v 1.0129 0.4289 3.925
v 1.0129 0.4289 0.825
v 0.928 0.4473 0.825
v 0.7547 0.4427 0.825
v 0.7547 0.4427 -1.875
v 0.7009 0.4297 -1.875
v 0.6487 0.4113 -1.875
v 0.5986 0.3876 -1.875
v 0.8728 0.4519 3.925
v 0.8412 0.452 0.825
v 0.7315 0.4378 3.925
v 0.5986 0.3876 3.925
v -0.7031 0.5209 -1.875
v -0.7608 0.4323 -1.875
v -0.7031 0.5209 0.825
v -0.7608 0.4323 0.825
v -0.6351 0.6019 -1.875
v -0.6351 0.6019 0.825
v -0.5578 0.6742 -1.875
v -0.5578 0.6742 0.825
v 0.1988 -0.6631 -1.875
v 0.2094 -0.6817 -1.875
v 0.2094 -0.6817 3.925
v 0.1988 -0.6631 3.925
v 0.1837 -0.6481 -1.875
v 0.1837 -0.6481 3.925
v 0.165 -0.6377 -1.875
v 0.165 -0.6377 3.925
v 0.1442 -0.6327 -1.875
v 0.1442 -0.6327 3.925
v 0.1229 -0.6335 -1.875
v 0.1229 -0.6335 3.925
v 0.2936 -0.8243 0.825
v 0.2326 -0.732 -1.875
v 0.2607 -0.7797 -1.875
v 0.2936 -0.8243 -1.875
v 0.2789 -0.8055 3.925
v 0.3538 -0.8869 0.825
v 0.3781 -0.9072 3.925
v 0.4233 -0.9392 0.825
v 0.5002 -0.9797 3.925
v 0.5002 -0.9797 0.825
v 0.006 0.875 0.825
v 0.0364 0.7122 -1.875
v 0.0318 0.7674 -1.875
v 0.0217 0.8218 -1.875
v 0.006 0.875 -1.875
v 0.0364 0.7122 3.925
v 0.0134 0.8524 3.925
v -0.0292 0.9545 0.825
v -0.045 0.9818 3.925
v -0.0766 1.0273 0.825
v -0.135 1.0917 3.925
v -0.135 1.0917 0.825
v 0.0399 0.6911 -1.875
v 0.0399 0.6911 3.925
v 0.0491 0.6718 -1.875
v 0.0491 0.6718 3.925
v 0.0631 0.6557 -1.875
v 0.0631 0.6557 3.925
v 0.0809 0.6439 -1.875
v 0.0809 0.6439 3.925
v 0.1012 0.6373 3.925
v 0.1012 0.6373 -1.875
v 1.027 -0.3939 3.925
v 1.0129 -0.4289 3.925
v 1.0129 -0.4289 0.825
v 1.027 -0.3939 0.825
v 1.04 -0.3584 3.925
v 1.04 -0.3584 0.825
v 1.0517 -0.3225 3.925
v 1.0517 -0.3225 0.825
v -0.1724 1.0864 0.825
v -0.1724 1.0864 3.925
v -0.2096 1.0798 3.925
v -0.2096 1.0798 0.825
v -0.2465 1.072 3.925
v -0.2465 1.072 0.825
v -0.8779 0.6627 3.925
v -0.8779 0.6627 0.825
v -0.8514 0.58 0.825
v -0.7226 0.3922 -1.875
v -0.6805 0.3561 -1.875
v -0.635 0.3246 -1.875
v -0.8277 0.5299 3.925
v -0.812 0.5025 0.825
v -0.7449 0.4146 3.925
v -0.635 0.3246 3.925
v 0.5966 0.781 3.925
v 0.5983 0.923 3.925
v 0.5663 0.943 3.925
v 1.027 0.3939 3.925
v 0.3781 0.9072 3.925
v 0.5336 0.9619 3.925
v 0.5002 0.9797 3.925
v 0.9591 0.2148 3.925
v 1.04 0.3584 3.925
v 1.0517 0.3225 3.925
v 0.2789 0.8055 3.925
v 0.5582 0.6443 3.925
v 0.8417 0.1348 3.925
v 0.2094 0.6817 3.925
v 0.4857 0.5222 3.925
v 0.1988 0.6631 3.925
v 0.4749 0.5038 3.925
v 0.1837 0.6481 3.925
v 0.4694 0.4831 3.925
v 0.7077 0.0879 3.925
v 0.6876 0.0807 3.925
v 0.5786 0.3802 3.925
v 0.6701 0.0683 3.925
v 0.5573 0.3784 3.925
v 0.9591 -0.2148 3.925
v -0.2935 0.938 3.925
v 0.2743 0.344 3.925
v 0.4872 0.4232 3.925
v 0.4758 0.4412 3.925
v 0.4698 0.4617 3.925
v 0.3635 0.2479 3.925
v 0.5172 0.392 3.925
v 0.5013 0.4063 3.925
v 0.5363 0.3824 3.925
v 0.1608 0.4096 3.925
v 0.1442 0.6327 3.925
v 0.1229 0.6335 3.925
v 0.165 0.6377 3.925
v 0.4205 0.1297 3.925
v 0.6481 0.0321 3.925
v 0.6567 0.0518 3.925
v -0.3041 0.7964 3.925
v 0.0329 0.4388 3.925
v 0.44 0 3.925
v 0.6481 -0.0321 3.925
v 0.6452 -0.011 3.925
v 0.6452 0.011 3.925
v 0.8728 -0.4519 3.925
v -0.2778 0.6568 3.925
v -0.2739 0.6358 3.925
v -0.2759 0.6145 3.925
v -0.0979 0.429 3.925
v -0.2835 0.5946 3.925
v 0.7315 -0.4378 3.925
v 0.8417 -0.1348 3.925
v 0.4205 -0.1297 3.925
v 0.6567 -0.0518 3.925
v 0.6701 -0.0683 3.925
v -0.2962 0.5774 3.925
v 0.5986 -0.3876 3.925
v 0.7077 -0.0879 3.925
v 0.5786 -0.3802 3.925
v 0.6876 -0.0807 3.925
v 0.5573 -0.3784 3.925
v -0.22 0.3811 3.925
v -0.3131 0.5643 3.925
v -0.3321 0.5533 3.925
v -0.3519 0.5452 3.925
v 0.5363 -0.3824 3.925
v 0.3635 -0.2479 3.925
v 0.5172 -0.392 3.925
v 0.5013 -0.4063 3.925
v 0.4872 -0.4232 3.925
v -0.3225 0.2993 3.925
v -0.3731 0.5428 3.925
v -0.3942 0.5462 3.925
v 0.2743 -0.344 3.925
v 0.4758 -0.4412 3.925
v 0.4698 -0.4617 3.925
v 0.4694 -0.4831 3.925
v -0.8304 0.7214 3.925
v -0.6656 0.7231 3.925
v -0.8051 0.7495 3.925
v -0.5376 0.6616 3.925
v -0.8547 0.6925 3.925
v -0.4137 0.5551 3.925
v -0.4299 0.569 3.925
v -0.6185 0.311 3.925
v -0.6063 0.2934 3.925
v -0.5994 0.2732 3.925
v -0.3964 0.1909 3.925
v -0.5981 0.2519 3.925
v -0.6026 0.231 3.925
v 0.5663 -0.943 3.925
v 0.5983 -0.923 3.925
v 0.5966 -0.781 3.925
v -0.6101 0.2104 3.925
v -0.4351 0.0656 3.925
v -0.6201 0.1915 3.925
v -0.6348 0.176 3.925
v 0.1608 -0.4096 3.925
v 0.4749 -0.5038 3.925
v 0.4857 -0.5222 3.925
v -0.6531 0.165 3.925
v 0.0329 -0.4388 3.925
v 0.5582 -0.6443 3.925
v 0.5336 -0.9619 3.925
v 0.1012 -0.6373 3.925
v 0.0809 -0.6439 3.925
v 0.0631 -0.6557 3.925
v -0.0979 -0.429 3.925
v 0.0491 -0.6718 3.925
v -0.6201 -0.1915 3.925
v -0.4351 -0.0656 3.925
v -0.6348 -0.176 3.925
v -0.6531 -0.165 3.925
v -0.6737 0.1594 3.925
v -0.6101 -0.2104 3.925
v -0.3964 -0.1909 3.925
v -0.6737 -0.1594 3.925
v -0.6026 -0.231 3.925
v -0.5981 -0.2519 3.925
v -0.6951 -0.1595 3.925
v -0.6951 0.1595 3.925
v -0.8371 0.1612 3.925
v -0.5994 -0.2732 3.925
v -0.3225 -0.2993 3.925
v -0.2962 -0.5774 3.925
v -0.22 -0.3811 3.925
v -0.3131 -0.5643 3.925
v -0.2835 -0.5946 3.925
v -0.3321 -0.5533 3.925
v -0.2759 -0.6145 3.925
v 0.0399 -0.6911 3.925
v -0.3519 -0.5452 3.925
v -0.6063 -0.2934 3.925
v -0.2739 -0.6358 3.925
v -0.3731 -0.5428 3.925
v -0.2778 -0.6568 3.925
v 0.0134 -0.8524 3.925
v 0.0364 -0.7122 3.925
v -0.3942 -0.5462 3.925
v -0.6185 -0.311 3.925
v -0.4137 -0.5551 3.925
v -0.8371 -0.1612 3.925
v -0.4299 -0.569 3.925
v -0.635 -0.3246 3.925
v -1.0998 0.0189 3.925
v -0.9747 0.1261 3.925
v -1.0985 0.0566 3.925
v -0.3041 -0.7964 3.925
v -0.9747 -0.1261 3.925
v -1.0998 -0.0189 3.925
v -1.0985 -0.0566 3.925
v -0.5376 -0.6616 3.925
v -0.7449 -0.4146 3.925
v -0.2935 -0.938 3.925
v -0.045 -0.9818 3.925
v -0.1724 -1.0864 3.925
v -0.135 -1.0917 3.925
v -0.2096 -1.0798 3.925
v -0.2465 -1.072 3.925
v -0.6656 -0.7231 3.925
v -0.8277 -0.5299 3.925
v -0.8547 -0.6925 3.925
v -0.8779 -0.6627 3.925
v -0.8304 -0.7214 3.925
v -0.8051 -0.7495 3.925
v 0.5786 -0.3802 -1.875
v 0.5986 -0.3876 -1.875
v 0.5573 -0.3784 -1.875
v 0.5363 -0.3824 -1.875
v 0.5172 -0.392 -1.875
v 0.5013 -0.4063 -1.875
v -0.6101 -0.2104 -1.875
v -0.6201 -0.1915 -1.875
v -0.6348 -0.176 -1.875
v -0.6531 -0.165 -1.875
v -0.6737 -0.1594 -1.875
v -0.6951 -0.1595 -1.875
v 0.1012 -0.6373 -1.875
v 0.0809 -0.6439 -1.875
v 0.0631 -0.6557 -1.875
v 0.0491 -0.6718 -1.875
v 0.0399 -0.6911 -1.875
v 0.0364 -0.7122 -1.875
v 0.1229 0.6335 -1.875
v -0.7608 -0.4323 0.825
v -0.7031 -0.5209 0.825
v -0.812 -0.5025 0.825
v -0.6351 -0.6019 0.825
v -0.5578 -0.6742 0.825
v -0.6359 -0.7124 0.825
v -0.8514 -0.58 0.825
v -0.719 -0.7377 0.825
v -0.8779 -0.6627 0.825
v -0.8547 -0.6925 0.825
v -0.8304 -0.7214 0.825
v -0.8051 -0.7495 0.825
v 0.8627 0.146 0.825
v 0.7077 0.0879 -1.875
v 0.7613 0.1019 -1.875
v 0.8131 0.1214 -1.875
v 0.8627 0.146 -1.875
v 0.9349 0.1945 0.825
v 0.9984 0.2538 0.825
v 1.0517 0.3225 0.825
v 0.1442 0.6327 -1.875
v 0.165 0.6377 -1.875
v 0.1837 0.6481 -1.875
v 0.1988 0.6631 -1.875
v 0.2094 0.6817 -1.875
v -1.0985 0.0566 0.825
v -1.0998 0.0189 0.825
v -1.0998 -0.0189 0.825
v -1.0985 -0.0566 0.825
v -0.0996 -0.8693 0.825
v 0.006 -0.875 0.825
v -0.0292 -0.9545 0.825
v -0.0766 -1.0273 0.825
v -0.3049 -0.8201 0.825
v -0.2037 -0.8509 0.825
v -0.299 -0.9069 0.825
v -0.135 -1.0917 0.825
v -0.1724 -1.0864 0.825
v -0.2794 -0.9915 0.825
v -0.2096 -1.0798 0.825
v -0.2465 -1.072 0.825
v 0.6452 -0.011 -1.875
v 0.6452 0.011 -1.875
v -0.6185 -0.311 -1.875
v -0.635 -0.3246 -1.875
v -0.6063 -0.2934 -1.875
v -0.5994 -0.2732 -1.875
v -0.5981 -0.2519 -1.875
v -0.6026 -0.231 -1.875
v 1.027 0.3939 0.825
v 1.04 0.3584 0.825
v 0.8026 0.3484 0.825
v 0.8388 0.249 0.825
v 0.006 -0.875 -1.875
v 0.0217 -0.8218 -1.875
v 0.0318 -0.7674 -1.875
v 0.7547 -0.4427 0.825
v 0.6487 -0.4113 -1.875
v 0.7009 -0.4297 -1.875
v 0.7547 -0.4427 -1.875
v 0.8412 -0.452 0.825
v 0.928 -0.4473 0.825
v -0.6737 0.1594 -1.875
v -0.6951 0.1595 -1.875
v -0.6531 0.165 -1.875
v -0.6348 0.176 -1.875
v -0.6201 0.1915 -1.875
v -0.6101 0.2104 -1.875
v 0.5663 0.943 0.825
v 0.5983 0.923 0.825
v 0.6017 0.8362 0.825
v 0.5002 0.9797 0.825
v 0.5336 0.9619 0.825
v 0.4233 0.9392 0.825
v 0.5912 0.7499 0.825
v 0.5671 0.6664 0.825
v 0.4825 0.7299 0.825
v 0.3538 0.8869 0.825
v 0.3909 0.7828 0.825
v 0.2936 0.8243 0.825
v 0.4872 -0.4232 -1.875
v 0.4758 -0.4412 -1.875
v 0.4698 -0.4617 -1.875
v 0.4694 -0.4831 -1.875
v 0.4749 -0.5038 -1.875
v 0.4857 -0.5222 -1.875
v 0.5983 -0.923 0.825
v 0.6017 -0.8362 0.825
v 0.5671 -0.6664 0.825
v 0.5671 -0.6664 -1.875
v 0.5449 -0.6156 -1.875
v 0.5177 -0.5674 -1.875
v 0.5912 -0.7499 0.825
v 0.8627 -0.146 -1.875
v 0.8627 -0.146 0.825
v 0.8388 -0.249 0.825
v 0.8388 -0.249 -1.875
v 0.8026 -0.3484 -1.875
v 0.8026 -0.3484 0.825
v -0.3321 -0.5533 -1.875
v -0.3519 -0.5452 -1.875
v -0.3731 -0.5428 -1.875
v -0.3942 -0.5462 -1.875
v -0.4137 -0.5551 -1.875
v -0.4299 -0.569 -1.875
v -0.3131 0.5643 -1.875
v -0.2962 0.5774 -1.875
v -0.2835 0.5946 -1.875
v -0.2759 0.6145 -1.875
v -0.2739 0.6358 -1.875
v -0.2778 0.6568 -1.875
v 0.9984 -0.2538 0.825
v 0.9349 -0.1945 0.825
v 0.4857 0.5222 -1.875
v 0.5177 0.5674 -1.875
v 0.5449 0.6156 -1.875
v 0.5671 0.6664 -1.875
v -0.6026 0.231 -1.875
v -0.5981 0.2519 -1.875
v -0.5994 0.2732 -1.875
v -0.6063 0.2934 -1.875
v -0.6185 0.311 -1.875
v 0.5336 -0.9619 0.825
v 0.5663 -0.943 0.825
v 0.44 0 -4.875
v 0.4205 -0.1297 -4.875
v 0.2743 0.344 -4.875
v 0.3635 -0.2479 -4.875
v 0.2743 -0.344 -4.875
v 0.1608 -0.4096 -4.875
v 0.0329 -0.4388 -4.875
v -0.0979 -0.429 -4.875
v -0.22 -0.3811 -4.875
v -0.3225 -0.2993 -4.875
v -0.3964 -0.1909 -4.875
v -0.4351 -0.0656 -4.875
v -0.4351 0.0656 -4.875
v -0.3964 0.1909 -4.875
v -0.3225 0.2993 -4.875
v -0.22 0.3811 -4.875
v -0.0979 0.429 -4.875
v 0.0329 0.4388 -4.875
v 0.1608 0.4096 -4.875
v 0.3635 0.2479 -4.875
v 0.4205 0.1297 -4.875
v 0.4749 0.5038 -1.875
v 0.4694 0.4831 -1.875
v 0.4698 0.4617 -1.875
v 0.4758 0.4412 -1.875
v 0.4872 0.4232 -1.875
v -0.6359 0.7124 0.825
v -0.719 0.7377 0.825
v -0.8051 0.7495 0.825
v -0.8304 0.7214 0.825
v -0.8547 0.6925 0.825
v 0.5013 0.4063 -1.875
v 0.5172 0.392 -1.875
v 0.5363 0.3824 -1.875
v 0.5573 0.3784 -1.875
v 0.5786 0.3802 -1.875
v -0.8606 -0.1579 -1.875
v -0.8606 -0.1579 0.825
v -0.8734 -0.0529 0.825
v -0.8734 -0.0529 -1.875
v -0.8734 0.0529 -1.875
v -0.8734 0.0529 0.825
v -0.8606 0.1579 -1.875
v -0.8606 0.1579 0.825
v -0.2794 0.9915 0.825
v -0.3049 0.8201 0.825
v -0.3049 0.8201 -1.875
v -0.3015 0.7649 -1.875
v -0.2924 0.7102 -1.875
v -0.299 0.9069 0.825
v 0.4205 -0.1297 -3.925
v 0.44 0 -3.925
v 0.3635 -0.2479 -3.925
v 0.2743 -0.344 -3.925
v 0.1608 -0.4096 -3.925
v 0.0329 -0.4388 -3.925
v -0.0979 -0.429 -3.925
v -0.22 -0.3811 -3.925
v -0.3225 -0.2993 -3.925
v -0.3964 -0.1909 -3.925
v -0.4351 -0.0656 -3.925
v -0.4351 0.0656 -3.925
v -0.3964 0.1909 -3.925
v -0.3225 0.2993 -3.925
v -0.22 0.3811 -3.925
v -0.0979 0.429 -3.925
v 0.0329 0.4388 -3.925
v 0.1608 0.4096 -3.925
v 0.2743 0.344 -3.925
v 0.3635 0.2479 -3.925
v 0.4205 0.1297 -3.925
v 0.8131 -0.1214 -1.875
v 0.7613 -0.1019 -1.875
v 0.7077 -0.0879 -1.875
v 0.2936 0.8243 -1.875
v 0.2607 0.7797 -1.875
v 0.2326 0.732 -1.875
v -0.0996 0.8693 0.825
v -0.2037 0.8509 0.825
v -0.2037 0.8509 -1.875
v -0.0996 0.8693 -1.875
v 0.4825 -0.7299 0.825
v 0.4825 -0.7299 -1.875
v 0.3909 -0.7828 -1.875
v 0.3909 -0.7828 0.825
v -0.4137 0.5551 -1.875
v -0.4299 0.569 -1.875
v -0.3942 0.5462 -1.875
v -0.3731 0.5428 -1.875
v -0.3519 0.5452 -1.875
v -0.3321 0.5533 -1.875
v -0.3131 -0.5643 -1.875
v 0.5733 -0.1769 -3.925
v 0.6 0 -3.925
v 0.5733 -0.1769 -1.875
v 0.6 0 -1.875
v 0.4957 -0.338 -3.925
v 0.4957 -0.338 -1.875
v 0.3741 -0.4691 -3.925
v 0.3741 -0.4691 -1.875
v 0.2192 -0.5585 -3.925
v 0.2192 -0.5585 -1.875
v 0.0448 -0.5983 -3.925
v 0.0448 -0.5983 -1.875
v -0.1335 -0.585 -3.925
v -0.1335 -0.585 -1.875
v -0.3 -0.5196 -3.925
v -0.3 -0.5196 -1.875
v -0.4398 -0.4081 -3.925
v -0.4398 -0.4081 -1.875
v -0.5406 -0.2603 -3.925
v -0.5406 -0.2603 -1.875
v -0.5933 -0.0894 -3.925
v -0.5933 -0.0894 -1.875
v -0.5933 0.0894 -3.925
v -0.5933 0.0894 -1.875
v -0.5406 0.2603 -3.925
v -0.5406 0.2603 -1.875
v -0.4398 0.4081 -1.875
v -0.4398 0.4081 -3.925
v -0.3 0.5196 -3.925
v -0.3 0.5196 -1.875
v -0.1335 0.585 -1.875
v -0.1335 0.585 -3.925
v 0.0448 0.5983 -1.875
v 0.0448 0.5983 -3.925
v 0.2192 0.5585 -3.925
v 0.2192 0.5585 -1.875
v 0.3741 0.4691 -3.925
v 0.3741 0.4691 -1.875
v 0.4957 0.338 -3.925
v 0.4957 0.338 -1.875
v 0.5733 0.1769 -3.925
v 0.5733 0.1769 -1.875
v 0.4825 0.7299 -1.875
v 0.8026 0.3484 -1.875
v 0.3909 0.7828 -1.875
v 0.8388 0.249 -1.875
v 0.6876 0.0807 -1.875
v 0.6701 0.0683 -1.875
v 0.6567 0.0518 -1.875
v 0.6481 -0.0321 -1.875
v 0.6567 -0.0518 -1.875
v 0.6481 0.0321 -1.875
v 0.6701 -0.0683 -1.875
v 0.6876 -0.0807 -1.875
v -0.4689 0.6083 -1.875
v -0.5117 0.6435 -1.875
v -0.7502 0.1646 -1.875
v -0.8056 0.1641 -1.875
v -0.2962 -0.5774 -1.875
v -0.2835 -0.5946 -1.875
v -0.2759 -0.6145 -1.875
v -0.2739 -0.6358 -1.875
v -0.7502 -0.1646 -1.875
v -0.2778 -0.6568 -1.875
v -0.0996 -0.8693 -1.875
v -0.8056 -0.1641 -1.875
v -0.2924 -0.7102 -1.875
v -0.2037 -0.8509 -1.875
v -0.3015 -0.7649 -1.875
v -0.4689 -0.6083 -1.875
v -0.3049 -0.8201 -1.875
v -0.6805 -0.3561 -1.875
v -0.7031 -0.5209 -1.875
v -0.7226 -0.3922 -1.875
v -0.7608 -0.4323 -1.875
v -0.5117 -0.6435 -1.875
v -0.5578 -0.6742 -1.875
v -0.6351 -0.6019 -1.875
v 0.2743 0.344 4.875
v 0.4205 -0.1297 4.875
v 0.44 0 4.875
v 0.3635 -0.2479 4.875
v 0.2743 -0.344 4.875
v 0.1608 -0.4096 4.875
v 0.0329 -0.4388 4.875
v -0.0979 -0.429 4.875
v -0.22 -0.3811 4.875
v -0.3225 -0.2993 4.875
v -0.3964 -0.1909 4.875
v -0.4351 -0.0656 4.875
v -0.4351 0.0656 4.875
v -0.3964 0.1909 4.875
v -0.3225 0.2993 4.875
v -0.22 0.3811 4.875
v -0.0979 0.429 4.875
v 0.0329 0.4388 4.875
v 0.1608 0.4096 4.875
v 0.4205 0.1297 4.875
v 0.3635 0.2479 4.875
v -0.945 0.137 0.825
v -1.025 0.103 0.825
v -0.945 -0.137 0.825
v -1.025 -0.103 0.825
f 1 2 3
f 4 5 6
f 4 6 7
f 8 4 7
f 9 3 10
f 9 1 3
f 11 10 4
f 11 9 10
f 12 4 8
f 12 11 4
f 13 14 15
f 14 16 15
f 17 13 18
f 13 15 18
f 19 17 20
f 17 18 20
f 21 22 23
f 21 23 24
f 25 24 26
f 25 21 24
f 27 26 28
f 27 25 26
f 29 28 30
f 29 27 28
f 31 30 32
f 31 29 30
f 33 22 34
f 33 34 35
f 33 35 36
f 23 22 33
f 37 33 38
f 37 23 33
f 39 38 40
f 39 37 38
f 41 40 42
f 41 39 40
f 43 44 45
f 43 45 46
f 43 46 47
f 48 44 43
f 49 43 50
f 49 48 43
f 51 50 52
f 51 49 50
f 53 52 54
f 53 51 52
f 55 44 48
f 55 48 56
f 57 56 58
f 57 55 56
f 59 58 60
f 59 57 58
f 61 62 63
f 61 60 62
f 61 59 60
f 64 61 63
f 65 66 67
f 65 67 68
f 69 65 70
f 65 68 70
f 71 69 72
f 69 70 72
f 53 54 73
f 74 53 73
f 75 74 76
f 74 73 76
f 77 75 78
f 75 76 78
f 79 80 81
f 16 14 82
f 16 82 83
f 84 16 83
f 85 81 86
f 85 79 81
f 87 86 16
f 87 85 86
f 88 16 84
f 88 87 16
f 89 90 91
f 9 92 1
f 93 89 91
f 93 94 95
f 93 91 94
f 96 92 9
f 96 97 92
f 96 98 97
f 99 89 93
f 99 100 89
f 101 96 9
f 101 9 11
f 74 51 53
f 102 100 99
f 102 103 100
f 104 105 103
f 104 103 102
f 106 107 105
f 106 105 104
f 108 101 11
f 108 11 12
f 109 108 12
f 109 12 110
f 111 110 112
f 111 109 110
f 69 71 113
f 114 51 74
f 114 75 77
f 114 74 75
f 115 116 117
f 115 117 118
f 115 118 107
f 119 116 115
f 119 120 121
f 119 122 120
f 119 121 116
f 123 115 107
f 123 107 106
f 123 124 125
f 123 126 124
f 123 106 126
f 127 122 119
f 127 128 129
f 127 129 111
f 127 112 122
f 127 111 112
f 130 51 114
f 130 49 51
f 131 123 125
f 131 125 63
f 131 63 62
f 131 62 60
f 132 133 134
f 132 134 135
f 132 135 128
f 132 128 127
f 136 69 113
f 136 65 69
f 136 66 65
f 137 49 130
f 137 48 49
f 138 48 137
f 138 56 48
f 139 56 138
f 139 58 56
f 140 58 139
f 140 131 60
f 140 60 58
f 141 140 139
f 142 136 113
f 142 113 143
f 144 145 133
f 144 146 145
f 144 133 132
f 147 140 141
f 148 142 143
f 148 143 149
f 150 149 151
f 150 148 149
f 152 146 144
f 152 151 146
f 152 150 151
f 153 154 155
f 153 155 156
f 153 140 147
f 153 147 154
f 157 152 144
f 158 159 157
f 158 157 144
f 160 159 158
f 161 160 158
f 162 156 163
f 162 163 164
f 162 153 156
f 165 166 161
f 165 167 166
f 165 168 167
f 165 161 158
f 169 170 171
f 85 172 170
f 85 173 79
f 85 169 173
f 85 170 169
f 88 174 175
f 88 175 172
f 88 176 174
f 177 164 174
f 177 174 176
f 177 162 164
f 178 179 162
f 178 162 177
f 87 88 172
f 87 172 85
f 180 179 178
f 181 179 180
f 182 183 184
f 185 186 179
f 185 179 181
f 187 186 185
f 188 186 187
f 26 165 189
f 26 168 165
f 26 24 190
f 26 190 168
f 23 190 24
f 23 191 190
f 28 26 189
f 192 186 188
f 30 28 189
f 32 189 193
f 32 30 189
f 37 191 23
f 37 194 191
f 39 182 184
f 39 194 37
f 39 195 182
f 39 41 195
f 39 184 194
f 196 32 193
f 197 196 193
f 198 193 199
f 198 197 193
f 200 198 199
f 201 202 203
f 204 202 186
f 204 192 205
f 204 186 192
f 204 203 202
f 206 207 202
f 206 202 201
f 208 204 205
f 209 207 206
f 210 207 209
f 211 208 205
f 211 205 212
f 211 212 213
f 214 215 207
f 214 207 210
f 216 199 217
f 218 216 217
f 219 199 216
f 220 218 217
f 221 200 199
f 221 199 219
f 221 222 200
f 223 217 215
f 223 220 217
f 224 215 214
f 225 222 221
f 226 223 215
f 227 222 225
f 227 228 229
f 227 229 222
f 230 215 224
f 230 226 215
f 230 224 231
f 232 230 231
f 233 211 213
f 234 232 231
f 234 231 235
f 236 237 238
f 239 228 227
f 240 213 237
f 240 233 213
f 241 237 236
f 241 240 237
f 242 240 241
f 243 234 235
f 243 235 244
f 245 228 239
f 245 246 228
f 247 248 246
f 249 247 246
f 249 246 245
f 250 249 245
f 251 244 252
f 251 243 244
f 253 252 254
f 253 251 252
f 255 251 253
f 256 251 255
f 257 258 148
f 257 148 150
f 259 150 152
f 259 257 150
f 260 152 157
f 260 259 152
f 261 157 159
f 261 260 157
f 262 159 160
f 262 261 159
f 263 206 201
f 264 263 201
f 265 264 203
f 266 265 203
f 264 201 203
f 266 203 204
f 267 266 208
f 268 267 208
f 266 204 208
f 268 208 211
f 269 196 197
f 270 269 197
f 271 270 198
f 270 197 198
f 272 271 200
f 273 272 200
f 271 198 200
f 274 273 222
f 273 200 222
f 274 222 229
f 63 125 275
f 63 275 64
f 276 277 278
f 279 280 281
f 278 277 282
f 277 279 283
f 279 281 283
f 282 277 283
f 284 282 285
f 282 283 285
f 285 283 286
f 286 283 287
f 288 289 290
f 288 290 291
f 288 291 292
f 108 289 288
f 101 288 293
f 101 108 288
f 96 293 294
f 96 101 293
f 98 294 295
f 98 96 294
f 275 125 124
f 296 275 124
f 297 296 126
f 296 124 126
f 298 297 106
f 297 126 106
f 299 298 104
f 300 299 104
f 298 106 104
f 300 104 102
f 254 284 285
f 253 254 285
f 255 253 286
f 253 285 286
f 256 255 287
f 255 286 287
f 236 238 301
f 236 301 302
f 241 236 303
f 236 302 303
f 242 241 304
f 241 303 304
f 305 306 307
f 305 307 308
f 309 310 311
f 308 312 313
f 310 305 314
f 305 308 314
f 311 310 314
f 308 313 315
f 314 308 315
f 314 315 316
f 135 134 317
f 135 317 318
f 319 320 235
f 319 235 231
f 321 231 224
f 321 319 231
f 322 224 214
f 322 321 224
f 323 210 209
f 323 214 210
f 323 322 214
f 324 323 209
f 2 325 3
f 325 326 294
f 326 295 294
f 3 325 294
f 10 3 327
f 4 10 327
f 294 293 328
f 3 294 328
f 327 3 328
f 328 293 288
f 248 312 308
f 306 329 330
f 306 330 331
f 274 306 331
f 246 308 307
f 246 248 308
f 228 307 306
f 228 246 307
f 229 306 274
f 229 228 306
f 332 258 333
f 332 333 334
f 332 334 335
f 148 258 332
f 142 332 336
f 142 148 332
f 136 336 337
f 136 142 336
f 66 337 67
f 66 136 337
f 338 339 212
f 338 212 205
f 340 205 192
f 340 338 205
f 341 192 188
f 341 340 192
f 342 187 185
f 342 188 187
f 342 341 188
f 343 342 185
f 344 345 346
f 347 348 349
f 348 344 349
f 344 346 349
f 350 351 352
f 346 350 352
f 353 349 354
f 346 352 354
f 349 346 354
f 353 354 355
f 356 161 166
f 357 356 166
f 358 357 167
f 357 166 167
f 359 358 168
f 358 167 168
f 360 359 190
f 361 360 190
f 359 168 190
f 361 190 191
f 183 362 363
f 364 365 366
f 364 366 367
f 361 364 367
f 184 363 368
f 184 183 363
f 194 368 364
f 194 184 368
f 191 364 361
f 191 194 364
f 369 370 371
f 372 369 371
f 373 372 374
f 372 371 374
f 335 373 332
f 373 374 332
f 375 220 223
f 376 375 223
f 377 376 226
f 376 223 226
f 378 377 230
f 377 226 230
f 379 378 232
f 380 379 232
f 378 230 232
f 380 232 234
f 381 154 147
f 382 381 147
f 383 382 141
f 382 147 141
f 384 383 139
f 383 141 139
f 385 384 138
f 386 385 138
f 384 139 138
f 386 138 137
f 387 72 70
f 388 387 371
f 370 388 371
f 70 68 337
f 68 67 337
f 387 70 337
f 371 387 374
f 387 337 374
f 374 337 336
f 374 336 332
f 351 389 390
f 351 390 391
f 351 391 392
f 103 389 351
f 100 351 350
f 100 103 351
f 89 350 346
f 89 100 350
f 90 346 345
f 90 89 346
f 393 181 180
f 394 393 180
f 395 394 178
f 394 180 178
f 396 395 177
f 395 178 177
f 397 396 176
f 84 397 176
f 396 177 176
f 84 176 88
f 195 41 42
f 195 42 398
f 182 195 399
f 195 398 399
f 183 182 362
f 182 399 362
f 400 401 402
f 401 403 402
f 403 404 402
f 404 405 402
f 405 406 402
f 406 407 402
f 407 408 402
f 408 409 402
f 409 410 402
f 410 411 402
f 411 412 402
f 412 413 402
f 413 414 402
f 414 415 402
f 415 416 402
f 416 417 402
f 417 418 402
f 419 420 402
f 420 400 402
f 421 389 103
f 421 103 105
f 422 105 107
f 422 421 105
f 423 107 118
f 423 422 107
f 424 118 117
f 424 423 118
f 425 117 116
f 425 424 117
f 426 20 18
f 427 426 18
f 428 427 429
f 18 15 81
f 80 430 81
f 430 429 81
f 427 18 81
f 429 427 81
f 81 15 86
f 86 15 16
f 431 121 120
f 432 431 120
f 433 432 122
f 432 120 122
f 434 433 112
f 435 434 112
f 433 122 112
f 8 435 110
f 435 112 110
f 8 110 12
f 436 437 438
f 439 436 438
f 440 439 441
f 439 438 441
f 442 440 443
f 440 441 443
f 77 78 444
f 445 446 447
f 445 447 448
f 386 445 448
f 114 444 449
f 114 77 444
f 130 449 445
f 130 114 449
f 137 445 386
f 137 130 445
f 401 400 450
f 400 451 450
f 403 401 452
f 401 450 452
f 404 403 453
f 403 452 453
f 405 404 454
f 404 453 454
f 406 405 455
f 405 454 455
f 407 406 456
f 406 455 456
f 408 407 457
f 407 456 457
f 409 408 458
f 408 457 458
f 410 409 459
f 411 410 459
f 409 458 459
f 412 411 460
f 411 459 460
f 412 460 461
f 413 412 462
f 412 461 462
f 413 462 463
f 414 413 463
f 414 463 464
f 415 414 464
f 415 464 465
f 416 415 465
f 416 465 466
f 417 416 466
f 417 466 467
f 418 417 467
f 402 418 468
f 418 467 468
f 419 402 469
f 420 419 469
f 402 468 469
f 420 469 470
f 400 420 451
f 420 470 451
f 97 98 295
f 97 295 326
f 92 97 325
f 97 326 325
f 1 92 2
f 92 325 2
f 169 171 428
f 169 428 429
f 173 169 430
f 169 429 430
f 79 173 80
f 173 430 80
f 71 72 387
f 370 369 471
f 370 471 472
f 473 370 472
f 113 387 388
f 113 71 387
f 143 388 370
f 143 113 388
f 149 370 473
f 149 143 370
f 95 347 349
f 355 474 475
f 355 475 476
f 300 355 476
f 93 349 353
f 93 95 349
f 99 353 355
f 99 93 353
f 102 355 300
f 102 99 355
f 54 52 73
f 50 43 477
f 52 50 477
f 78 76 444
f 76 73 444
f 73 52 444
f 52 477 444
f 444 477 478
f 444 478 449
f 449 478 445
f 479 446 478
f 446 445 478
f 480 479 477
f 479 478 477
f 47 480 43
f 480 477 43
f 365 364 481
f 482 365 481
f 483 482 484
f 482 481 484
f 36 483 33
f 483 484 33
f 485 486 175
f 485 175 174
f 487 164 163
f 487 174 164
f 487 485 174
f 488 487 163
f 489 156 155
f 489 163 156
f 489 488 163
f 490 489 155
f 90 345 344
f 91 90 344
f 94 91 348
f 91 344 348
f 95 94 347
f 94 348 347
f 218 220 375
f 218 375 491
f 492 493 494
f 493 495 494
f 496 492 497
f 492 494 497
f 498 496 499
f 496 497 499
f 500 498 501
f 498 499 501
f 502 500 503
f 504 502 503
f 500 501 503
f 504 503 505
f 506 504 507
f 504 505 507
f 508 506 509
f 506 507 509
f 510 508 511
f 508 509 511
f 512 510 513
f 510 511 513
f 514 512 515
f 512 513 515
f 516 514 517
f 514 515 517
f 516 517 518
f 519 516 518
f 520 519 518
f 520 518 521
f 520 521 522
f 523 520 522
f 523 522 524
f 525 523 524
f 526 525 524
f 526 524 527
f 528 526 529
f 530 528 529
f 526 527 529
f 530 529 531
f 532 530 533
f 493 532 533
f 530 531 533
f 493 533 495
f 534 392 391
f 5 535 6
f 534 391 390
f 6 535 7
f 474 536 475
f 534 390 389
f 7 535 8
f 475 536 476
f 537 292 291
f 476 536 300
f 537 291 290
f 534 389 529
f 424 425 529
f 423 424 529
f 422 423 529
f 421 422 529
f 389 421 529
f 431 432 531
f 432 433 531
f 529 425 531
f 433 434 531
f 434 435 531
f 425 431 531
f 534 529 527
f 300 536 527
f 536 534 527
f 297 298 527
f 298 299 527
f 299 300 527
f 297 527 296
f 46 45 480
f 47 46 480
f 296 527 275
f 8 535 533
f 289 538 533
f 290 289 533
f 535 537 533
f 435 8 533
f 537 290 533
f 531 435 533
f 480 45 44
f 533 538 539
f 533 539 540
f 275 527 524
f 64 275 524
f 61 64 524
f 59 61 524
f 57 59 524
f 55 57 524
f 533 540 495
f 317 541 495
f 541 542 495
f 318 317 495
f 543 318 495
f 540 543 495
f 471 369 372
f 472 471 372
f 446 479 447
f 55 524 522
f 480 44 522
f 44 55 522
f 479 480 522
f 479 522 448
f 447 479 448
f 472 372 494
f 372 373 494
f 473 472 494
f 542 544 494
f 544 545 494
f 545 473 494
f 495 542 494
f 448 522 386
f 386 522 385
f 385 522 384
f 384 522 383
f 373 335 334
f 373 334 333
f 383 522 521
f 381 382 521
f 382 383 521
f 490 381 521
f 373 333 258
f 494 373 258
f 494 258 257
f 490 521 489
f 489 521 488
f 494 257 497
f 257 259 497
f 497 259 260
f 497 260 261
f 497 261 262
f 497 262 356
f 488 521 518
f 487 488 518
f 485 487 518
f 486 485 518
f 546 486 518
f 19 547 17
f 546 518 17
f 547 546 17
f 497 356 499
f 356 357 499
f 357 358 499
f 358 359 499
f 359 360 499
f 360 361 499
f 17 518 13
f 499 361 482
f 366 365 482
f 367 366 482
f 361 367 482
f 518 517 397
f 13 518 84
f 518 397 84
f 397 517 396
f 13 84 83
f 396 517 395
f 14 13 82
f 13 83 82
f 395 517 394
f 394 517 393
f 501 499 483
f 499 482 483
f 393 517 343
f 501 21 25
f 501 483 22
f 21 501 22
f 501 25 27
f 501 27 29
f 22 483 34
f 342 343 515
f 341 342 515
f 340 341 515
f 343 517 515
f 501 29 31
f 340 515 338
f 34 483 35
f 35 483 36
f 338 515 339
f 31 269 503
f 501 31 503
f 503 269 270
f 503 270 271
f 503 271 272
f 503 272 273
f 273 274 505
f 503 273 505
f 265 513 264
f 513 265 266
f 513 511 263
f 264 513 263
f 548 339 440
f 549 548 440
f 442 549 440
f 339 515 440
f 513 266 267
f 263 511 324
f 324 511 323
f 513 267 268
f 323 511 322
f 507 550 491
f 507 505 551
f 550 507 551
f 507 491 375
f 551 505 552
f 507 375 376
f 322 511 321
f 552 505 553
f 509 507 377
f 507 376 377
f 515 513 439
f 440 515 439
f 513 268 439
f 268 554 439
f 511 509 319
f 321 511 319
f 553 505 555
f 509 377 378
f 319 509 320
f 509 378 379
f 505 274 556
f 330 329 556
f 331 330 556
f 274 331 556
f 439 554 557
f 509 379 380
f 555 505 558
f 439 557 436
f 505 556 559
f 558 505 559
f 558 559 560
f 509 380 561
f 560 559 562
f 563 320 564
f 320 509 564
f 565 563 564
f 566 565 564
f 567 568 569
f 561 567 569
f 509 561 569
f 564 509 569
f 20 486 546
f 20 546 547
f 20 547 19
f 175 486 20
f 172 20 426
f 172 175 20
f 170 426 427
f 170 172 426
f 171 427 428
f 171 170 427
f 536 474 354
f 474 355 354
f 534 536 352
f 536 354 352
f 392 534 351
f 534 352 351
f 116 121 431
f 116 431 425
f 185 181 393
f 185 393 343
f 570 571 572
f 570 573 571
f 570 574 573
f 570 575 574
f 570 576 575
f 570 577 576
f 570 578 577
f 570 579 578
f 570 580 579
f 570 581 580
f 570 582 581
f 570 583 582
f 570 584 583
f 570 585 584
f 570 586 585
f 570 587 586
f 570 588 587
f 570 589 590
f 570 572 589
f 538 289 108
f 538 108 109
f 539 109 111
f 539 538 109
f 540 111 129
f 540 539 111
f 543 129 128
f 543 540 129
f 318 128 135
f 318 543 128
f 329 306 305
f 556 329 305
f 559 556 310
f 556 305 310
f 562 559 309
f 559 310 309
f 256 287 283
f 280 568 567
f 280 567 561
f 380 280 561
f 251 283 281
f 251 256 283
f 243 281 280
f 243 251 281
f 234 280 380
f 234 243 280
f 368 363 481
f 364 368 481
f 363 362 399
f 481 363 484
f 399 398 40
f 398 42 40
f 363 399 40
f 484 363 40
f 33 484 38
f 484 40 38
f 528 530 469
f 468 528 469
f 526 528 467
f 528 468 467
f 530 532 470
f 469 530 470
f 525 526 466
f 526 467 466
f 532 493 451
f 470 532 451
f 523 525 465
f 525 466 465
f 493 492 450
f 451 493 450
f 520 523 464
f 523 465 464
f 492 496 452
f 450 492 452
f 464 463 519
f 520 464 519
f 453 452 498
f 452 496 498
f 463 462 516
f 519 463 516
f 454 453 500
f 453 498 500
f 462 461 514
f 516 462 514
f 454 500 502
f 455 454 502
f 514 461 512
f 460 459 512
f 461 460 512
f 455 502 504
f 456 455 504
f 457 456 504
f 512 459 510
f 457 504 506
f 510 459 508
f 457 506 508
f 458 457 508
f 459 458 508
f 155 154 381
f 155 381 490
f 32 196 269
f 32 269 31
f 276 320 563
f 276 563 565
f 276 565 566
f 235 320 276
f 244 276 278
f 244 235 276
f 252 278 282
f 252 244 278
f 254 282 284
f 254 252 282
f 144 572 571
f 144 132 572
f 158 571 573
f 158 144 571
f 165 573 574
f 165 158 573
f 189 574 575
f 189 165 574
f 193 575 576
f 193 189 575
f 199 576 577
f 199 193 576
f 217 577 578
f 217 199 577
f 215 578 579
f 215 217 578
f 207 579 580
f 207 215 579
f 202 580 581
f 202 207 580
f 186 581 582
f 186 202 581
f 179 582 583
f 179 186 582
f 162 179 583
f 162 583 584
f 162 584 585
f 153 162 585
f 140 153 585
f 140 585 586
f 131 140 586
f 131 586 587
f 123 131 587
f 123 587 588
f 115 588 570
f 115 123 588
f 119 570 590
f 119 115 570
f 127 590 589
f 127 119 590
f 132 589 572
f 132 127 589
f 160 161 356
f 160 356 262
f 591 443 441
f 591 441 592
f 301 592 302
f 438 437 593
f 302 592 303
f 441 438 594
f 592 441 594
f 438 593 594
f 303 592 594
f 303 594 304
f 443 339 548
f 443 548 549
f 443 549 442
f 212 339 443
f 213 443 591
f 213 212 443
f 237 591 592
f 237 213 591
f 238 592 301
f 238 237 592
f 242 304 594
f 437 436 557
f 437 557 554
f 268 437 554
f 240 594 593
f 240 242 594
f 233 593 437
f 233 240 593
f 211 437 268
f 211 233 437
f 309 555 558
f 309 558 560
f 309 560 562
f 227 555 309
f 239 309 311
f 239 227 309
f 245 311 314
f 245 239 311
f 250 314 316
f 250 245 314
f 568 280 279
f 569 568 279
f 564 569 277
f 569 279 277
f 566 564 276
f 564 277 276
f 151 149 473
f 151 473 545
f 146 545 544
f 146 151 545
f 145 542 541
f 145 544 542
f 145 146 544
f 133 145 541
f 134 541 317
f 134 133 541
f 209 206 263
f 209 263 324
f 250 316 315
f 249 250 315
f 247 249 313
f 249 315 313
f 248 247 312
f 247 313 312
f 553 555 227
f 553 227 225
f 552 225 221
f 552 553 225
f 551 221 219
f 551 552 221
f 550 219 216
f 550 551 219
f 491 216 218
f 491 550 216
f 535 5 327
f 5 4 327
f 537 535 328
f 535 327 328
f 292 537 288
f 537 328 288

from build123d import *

# Parameters (mm, degrees)
BOSS_EXTRUDE1_DEPTH      = 4.875
BOSS_EXTRUDE1_DEPTH_BACK = 4.875
SKETCH3_R                = 1.1
CUT_EXTRUDE1_DEPTH       = 6.11718917
FILLET1_R                = 0.078539816
CIRPATTERN1_COUNT        = 9
FILLET1_OF_CIRPATTERN1_R = 0.078539816
SKETCH5_W                = 0.95
SKETCH5_H                = 0.86


with BuildPart() as part:
    # Sketch3 → Boss-Extrude1 (new, two sides: drawn at the far end of the back side and taken through both)
    with BuildSketch(Plane.XY.offset(-BOSS_EXTRUDE1_DEPTH_BACK)):
        Circle(SKETCH3_R)
    extrude(amount=BOSS_EXTRUDE1_DEPTH + BOSS_EXTRUDE1_DEPTH_BACK)

    # Sketch4 → Cut-Extrude1 (cut, symmetric)
    with BuildSketch(Plane.XY):
        with BuildLine():
            Line((0.645237551, -0.078539816), (0.645237551, 0.078539816))
            ThreePointArc((0.645237551, 0.078539816), (0.876414028, 0.153933636), (1.051662121, 0.322500826))
            ThreePointArc((1.051662121, 0.322500826), (1.1, 0), (1.051662121, -0.322500826))
            ThreePointArc((1.051662121, -0.322500826), (0.876414028, -0.153933636), (0.645237551, -0.078539816))
        make_face()
    cut_extrude1 = extrude(amount=CUT_EXTRUDE1_DEPTH, both=True, mode=Mode.SUBTRACT)

    # Fillet1
    fillet1_edges = [part.edges().sort_by_distance(p)[0] for p in [
        (0.645237551, 0.078539816, 0),
        (0.645237551, -0.078539816, 0),
    ]]
    fillet(fillet1_edges, radius=FILLET1_R)

    # CirPattern1: Cut-Extrude1 ×9 about axis
    cirpattern1_axis = Axis((0, 0, 0), (0, 0, 1))
    for i in range(1, CIRPATTERN1_COUNT):
        add(cut_extrude1.rotate(cirpattern1_axis, i * 360 / CIRPATTERN1_COUNT), mode=Mode.SUBTRACT)

    # Fillet1 of CirPattern1
    fillet1_of_cirpattern1_edges = [part.edges().sort_by_distance(p)[0] for p in [
        (0.44379622, 0.474915693, 0),
        (0.544765061, 0.354585713, 0),
        (0.034697705, 0.649073239, 0),
        (0.189390945, 0.621796647, 0),
        (-0.390636252, 0.519522202, 0),
        (-0.254601299, 0.598062019, 0),
        (-0.633187165, 0.146880954, 0),
        (-0.579462766, 0.294487526, 0),
        (-0.579462766, -0.294487526, 0),
        (-0.633187165, -0.146880954, 0),
        (-0.254601299, -0.598062019, 0),
        (-0.390636252, -0.519522202, 0),
        (0.189390945, -0.621796647, 0),
        (0.034697705, -0.649073239, 0),
        (0.544765061, -0.354585713, 0),
        (0.44379622, -0.474915693, 0),
    ]]
    fillet(fillet1_of_cirpattern1_edges, radius=FILLET1_OF_CIRPATTERN1_R)

    # Sketch5 → Cut-Revolve1 (revolve, cut)
    with BuildSketch(Plane(origin=(0, 0, 0), x_dir=(0, 0, -1), z_dir=(1, 0, 0)), mode=Mode.PRIVATE) as cut_revolve1_sk:
        Polygon((4.875, 1.3), (4.875, 0.44), (3.925, 0.44), (3.925, 0.6), (1.875, 0.6), (1.875, 0.875), (-0.825, 0.875), (-0.825, 1.3), align=None)
        with Locations((-4.4, 0.87)):
            Rectangle(SKETCH5_W, SKETCH5_H)
    revolve(cut_revolve1_sk.sketch.rotate(Axis((0, 0, 4.875), (0, 0, -1)), 90), axis=Axis((0, 0, 4.875), (0, 0, -1)), mode=Mode.SUBTRACT)


solid = part.part
